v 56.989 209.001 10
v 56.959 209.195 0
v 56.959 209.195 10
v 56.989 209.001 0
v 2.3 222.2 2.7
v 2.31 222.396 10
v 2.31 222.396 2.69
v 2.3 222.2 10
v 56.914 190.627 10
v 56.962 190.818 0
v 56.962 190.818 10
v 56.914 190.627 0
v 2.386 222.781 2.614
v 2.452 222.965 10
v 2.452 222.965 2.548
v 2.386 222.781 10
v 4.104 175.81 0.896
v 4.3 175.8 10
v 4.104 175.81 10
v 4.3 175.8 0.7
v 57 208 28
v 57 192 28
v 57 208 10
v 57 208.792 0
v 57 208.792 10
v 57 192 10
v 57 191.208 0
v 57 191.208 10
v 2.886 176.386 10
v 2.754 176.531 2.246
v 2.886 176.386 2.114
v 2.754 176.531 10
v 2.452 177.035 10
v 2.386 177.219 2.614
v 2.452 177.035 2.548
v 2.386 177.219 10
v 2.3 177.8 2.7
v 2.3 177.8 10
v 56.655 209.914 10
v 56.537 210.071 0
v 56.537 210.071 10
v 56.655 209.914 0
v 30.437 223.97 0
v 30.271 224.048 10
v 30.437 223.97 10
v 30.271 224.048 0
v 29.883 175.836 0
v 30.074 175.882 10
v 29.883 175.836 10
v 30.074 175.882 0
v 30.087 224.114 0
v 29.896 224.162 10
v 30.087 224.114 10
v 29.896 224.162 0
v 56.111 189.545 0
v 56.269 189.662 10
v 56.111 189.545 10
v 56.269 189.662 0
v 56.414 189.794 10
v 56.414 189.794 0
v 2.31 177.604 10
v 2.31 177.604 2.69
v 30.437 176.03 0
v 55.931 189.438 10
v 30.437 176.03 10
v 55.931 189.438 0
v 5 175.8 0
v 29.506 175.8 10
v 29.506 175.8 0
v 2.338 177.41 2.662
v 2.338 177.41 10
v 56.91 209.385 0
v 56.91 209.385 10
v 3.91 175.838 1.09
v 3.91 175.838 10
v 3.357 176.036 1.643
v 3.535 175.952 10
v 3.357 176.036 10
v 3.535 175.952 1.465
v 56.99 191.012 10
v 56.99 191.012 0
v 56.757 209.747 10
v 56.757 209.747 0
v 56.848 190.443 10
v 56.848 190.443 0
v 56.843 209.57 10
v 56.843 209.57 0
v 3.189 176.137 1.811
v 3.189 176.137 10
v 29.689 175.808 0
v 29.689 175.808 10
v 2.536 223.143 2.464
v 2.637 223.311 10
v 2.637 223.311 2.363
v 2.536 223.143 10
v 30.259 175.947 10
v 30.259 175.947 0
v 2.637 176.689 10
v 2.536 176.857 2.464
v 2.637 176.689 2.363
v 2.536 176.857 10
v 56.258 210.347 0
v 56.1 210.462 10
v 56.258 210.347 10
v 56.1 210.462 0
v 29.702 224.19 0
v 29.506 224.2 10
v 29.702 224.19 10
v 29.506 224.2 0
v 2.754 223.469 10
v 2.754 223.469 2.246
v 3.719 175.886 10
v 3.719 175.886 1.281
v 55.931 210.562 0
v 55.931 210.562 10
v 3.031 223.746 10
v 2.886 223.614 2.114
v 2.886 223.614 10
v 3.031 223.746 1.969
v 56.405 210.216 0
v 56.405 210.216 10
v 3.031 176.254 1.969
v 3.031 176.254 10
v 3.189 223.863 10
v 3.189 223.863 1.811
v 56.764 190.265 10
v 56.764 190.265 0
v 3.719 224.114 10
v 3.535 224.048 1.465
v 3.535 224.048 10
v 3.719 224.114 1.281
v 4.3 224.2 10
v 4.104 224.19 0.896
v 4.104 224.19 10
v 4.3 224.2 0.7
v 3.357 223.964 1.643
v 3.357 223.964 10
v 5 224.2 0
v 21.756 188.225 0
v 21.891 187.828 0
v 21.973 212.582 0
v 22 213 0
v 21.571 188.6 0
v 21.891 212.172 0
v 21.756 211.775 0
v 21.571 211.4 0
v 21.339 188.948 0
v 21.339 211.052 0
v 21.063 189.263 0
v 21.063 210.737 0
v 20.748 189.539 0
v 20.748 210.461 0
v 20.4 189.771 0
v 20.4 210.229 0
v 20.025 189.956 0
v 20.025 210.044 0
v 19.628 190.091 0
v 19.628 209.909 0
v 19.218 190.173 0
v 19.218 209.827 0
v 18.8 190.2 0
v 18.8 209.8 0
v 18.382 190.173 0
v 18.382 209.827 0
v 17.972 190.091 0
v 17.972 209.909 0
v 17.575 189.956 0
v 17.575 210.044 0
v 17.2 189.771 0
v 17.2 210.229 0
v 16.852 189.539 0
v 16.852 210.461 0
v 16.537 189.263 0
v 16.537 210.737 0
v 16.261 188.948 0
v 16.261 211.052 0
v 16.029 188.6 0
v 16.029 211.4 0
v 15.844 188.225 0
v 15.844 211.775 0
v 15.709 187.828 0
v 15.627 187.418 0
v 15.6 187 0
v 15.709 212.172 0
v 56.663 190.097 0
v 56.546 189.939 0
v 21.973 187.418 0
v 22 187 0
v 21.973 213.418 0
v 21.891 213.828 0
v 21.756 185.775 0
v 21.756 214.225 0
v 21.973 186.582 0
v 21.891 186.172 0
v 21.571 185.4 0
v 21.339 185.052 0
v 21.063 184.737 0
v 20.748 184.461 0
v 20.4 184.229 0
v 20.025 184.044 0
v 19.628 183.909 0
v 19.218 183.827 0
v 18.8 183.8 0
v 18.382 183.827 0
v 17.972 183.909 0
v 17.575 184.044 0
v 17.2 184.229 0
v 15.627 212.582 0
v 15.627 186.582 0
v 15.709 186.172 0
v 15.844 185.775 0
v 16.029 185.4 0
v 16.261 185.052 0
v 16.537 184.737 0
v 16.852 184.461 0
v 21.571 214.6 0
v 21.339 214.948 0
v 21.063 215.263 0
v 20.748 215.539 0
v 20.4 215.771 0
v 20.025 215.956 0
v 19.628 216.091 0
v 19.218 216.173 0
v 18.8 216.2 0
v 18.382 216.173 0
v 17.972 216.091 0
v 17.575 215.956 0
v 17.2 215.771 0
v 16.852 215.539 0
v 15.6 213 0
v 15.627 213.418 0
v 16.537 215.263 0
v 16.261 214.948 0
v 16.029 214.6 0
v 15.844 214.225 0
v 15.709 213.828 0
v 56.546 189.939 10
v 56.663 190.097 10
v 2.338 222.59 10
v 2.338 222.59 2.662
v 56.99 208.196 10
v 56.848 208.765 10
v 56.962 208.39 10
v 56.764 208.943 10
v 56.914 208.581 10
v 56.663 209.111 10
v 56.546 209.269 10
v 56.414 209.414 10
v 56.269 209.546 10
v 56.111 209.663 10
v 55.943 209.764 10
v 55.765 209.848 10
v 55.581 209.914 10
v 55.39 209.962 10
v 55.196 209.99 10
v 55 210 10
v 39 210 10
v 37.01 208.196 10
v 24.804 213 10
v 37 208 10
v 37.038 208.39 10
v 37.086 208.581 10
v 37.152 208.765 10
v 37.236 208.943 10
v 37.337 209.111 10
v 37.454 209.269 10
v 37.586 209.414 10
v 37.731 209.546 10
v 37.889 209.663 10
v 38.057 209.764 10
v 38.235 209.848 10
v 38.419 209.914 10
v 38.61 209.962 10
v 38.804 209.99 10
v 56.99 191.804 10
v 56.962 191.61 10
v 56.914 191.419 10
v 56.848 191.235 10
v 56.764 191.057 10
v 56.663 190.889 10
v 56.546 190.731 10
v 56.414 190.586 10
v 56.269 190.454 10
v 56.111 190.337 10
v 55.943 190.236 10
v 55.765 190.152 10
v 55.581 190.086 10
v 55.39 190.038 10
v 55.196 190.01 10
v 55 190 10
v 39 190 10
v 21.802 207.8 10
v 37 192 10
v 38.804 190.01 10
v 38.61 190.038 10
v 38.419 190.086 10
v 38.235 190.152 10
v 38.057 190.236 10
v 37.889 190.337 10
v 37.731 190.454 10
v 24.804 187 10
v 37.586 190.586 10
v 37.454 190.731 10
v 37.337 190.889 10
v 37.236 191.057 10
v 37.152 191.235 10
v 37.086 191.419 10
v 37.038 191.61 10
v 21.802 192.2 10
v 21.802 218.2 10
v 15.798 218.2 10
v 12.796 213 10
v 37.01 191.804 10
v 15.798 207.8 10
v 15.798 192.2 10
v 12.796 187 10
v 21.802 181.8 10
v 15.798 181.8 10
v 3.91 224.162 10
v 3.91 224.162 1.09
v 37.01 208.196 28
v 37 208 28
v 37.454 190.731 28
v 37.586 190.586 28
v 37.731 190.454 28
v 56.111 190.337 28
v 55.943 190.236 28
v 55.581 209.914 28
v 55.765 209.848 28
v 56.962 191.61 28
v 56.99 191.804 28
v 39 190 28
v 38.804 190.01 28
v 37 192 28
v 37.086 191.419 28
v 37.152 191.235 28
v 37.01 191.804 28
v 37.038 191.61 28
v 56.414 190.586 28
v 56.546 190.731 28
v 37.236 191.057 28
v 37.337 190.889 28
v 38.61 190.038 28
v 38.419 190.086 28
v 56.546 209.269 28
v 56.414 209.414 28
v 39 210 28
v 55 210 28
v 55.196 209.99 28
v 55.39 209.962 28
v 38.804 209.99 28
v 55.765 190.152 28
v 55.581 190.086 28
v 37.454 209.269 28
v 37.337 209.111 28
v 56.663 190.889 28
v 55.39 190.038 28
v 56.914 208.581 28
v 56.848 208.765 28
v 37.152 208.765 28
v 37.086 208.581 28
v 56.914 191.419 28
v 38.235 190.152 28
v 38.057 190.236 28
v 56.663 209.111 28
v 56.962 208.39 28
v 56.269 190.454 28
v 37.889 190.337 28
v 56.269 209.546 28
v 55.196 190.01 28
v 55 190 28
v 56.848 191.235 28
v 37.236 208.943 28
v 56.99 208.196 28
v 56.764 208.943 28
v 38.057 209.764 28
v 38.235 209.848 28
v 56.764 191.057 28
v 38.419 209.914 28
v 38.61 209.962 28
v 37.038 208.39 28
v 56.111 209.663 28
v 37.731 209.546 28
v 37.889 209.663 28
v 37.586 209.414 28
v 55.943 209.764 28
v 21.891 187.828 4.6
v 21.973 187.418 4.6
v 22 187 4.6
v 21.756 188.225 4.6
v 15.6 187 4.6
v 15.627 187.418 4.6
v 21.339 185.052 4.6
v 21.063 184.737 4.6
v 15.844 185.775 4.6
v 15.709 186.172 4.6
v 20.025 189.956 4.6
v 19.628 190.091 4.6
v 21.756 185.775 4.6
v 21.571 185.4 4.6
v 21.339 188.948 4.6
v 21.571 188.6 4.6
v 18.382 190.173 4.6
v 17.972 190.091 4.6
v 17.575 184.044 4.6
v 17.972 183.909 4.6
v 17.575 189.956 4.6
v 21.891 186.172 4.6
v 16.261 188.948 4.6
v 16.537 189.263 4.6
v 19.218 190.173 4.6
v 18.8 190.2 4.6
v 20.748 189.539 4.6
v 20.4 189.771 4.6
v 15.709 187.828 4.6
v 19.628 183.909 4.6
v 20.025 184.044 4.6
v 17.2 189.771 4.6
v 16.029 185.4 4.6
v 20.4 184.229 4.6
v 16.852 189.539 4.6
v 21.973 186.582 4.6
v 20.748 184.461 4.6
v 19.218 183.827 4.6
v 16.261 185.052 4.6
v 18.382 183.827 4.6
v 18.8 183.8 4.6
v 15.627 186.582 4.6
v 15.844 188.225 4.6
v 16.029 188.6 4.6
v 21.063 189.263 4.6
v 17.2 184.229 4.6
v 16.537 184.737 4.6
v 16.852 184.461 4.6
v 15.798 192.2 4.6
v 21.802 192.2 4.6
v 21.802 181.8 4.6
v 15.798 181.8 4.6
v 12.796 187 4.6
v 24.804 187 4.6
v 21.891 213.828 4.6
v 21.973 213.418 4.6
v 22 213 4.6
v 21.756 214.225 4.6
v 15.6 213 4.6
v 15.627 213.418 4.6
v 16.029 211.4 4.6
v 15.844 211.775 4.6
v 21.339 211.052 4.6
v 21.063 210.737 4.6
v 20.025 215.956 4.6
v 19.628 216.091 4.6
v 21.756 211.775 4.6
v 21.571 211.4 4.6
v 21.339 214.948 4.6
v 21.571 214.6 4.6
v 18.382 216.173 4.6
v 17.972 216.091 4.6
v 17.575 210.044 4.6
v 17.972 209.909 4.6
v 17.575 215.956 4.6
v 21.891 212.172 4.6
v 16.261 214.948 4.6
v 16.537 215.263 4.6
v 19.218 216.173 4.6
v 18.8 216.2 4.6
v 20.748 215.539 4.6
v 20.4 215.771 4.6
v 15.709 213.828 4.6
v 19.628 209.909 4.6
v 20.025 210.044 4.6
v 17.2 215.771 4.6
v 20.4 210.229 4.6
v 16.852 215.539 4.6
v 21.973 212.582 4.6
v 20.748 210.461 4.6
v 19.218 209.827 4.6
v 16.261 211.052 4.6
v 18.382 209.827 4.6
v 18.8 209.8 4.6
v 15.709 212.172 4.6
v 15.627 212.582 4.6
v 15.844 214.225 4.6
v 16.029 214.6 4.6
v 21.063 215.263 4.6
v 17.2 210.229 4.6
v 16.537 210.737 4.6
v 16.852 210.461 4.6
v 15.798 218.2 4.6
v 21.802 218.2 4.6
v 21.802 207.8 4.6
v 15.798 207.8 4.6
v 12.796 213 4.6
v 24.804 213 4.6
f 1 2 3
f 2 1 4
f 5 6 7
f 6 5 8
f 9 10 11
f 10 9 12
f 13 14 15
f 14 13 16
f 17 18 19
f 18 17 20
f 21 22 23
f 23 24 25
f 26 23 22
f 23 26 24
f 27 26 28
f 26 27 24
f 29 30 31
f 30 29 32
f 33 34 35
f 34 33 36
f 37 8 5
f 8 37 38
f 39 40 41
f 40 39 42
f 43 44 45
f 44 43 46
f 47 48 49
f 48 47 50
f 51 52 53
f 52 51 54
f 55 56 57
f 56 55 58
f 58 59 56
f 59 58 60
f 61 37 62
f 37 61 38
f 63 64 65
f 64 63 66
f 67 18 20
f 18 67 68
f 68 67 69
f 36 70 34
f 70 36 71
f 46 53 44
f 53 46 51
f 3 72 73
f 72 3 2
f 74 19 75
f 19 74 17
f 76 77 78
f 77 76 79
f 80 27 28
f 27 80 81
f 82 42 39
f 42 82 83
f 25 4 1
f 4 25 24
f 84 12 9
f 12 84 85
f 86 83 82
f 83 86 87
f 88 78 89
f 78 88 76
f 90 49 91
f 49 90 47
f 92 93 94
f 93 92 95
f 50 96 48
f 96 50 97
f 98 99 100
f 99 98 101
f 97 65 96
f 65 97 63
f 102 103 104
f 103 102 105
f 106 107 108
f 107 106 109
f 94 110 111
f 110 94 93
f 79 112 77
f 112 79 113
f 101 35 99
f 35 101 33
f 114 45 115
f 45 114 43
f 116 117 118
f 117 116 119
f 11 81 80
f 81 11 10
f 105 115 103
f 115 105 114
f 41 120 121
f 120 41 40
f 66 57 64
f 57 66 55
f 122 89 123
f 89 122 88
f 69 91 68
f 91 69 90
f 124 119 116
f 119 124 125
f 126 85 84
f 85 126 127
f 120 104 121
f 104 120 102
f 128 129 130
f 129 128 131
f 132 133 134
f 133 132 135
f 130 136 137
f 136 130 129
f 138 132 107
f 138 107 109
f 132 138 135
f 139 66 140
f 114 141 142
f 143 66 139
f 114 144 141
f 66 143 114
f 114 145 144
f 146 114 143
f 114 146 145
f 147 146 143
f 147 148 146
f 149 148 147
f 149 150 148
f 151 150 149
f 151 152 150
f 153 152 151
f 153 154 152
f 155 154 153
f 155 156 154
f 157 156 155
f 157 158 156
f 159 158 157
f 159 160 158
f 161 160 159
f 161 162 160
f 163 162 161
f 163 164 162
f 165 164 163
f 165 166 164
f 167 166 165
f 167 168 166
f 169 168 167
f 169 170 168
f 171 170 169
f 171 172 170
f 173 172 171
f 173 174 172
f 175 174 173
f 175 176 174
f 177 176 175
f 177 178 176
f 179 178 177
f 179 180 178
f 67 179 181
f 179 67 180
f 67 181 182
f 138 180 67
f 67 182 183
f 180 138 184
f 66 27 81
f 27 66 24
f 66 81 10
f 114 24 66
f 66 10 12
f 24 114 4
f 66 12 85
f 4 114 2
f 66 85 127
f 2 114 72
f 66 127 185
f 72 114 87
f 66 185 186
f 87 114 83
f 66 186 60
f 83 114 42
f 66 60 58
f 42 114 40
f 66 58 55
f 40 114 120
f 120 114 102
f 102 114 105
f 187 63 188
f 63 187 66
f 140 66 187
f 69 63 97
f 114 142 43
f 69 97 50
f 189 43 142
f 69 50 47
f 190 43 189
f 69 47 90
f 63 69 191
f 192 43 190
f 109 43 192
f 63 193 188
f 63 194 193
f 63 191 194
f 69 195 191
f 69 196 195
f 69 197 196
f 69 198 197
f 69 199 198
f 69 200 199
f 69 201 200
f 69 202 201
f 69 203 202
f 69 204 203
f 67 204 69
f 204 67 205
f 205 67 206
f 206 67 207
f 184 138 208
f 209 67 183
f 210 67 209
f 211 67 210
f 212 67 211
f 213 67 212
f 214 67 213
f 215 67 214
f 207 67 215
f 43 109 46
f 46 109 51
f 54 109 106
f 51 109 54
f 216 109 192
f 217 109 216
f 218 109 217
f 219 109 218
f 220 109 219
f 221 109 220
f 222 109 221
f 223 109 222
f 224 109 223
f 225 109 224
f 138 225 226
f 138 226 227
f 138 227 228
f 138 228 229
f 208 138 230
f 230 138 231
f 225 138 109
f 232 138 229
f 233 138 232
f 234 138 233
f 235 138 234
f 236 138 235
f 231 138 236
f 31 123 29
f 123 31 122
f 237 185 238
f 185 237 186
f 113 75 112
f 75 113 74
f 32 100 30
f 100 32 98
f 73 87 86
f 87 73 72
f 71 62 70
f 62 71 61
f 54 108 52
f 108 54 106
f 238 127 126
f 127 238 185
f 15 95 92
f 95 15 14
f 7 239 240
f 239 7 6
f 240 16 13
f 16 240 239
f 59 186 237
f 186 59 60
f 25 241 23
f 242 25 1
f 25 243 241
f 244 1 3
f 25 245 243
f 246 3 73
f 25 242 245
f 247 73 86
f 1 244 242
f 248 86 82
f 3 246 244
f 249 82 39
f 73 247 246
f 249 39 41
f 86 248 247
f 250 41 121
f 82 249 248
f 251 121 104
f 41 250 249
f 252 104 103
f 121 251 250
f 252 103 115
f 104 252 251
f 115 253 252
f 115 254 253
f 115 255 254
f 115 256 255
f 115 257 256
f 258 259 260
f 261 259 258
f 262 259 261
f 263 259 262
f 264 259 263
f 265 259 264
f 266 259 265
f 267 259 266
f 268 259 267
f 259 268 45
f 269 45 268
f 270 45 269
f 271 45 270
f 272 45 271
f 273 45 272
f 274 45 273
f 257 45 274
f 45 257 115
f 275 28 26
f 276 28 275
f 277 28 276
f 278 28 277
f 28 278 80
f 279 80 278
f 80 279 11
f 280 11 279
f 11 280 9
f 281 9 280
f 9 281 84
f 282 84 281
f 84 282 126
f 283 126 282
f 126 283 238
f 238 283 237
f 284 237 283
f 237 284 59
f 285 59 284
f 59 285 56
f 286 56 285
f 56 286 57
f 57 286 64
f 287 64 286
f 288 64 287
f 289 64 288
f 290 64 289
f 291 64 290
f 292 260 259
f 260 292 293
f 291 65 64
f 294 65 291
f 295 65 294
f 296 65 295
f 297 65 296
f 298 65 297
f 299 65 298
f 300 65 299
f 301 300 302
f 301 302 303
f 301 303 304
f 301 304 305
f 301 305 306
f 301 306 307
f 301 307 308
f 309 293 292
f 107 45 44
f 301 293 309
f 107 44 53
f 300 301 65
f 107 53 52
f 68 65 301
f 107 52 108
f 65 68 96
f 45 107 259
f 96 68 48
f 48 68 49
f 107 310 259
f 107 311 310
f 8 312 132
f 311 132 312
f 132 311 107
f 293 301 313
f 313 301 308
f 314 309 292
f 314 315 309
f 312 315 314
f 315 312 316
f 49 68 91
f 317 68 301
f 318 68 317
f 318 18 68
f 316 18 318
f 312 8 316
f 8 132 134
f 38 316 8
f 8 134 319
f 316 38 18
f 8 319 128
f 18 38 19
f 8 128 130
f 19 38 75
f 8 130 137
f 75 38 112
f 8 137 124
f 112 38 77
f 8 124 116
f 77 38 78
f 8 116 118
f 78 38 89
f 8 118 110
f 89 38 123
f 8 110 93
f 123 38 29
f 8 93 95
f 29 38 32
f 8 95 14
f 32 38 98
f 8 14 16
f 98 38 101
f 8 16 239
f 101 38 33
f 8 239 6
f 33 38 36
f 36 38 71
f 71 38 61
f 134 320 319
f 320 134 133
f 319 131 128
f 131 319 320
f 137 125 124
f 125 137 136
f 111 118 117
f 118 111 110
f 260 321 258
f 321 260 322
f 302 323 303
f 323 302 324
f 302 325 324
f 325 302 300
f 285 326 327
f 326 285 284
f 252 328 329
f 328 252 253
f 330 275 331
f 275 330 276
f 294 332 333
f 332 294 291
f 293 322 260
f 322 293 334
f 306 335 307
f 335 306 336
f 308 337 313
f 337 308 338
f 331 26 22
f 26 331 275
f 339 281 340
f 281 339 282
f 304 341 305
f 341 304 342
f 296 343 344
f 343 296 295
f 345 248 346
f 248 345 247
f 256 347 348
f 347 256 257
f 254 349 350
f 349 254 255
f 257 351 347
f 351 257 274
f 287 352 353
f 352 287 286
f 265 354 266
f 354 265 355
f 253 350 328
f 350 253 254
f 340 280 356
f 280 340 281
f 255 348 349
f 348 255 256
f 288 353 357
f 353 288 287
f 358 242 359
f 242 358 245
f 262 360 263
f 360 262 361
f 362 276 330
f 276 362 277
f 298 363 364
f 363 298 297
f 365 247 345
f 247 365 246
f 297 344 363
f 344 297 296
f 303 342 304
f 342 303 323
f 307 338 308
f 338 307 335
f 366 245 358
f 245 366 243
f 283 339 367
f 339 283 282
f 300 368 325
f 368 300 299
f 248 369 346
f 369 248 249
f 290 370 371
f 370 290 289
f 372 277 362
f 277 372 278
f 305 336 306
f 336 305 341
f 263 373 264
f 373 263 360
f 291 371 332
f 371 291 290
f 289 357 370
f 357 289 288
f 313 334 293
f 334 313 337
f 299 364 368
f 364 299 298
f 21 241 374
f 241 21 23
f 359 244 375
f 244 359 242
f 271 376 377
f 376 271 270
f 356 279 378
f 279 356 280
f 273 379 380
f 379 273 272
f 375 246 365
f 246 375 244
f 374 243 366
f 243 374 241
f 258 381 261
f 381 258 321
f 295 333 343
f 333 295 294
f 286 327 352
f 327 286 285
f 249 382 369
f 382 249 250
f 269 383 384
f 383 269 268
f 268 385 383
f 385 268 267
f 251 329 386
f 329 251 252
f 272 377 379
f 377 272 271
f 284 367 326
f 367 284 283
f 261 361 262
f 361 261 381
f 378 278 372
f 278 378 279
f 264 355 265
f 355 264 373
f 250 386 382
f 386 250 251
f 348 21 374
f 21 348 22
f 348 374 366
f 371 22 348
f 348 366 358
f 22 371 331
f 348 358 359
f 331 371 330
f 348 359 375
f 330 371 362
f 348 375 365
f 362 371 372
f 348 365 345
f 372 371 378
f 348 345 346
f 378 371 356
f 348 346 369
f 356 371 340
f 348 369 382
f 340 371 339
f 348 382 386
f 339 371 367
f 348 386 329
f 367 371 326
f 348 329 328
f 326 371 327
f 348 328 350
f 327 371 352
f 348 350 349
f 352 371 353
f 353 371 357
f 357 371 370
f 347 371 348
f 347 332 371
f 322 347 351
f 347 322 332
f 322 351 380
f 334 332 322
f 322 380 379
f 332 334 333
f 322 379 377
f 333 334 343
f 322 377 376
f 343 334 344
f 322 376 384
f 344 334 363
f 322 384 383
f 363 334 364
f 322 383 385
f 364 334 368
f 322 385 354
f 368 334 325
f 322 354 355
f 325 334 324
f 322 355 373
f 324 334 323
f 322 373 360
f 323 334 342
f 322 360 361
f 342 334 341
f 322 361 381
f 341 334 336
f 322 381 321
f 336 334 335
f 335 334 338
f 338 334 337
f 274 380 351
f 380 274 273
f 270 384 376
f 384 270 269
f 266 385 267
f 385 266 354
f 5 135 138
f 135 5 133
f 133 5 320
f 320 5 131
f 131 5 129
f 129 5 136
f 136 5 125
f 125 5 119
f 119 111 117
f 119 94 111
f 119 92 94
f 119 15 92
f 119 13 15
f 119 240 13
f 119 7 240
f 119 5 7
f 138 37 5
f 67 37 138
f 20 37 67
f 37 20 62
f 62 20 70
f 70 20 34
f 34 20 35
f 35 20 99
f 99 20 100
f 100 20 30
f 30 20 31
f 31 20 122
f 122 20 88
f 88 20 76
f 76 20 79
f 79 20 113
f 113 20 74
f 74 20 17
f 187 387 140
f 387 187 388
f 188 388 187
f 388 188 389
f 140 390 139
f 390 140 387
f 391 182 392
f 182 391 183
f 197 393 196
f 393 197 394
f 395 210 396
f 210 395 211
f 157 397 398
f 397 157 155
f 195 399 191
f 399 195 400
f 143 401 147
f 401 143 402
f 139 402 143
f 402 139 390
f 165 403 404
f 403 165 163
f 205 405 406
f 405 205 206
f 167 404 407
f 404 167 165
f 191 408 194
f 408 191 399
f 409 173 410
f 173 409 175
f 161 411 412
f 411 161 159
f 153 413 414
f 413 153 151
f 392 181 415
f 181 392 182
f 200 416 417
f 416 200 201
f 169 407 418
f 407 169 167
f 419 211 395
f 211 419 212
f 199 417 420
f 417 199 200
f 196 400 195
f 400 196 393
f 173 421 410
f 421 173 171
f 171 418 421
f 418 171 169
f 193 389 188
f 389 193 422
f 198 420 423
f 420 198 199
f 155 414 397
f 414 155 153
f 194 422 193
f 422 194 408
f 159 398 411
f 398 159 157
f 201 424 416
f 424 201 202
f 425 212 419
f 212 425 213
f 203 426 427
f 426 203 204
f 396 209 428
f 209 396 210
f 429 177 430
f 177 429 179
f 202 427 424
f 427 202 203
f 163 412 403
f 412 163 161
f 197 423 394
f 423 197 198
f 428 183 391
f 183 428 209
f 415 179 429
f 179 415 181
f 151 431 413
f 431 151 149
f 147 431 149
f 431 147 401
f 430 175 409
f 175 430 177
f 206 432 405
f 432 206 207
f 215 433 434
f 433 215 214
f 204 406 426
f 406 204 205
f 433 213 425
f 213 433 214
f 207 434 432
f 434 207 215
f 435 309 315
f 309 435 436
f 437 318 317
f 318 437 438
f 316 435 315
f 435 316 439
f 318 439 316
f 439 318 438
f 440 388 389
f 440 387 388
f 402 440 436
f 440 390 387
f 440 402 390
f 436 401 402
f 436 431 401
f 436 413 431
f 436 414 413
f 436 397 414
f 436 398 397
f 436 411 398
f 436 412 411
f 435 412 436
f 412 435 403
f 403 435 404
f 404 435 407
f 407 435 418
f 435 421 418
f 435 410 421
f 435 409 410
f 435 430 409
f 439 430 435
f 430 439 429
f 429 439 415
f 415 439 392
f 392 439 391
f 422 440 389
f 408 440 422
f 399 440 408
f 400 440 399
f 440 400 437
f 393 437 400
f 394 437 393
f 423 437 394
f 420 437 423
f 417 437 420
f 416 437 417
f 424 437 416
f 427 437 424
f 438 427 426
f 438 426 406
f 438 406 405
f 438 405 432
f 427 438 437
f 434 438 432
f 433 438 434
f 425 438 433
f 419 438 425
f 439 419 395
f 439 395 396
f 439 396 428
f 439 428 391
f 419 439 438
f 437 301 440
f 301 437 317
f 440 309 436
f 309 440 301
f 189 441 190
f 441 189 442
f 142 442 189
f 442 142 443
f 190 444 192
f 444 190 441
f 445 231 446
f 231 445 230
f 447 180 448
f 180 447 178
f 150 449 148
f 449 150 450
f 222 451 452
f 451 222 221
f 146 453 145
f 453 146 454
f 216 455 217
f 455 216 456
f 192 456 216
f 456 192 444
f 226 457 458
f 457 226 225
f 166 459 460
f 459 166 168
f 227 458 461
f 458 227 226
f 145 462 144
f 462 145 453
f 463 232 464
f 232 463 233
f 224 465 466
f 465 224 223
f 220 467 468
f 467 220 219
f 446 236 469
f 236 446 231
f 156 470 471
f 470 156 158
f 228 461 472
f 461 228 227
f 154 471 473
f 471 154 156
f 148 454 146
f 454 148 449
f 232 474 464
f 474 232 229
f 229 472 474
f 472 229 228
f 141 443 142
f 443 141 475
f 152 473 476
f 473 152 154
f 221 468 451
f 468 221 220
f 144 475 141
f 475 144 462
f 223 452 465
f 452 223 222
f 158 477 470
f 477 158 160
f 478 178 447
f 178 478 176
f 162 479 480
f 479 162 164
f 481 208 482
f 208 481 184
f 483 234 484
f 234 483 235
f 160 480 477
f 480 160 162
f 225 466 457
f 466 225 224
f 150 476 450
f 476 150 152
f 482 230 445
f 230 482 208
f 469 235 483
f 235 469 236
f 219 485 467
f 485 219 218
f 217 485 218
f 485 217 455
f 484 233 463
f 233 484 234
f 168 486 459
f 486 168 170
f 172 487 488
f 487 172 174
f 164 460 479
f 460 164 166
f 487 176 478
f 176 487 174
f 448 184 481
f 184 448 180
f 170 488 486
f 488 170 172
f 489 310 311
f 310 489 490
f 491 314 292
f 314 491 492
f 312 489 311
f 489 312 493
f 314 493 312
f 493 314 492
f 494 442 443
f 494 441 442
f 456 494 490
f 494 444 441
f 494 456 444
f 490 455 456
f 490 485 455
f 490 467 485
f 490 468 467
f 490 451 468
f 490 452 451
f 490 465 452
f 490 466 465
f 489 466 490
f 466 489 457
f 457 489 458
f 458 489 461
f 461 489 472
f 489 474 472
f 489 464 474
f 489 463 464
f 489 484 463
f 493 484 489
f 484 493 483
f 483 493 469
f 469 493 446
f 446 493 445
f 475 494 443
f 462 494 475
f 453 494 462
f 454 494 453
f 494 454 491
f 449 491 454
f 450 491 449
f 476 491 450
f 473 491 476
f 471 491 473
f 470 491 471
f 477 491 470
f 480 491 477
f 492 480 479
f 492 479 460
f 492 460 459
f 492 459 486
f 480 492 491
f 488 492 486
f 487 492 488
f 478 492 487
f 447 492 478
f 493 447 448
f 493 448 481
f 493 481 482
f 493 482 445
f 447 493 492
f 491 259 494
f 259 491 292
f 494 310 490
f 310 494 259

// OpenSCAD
// file: ../../../modules/steel_rack.scad
use <bolts.scad>;

bolt_edge_offset = 15;
bolt_positions = [
  bolt_edge_offset,
  bolt_edge_offset + 98,
  bolt_edge_offset + 98 + 24,
];

module bolt_and_nut(y, h) {
  nut_thickness = 5;
  translate([0, y, h / 2])
    m6_bolt_hole(h + 1, center = true);
  translate([0, y, h - nut_thickness / 2])
    rotate([0, 0, 90])
    m6_nut_trap(nut_thickness, center = true);
}

module long_bar(w, y, h) {
  difference() {
    translate([w / 2, y / 2, h / 2])
      cube([w, y, h], center = true);

    for (x = bolt_positions) {
      translate([x, 0, 0])
        bolt_and_nut(y / 2, h);
    }
  }
}

module short_bar(w, y, h) {
  difference() {
    translate([w / 2, y / 2, h / 2])
      cube([w, y, h], center = true);

    translate([bolt_positions[0], 0, 0])
      bolt_and_nut(y / 2, h);
  }
}

module fillet_profile(r, h) {
  linear_extrude(height = h, center = true)
    difference() {
      square([r, r]);
      circle(r = r, $fn = 64);
    }
}
// file: ../../../modules/slide_rail_outer_bracket.scad
use <bolts.scad>
use <steel_rack.scad>

// スライドレール外側とL字アングルを接合するL字ブラケット。
// 設計の経緯と確定値は ledger/designs/steel-rack-500x400.md が正本。
//
// 座標系 (部品自身の datum):
//   X = 0 がこの部品側のL字アングル外側面。部品はアングル板厚の内側から始まる
//   Y = 0 がスライドレール外側面。+Y がラック外側
//   Z = 0 が部品底面 (レール下端と一致)
// front は screw_x = [37, 101.5]、rear は [79.5, 176] を自分の datum
// から渡す。 M6 が高さ 22.5±12 の対称配置のため部品は Z 反転対称になり、
// 左右のレールにも上下反転するだけで同じ2部品を使い回せる。

bracket_height = 45;
flange_t = 10; // 短辺 (X方向厚) の厚さ
// 長辺 (Y方向厚) の厚さ。旧断面は flange_t=10 を共用していたが、レール面を
// rail_offset 分外へ出すと M6 ナット挿入口が長辺と重なるため 2mm 削った
// (10→8、user決定)。ナット六角の内縁 (y=8.000) と長辺外面がツライチになる
arm_t = 8;
// レール接触面のラック外側オフセット。組付け実測でレール間隔が 385mm しか
// なくケース 412mm が入らないため、(412 - 385) / 2 + 0.5 = 14mm ずつ
// 各レールを外側へ移す (user指示)。M6 実穴は既に開いており位置を変えられない
rail_offset = 14;
inner_r = 4;
m6_z = [ 10.5, 34.5 ];
// クリアランス基準: 呼び寸法 + 0.4mm (実プリントの嵌合結果から拡大)
m6_pass_flat = 6.4; // M6ボルト通し六角の二面幅 (手前5mm)
m6_nut_flat = 10.4; // M6ナット窪み六角の二面幅 (奥5mm、ナット実測9.8 + 実効0.6)
m6_stage_depth = 5;
screw_z = 22.5;
m4_pass_flat = 4.4; // M4小トラスネジ通し六角の二面幅
m4_nut_flat = 7.4; // M4ナット窪み六角の二面幅 (ナット実測6.8 + 実効0.6)
m4_nut_depth = 2.8; // M4ナット窪みの深さ (user指定)
edge_margin = 8; // 穴の外縁から部品端までの余白 (自由な辺のみ)
angle_t = 2.2; // L字アングルの板厚

// 六角プリズム: 軸X・上下の辺が水平 (flat-up)。
// 天井を短い水平ブリッジにして垂れの改善を狙う
// (point-up だと天井面が水平から30°になり垂れた — 嵌合試験で確認済み)
module
hex_x_flat_up(flat_d, l)
{
    rotate([ 0, 90, 0 ]) rotate([ 0, 0, 90 ]) hex_hole(flat_d = flat_d, h = l);
}

// 六角プリズム: 軸Y・上下の辺が水平 (flat-up)。M6と同じくブリッジ天井
module
hex_y_flat_up(flat_d, l)
{
    rotate([ 90, 0, 0 ]) hex_hole(flat_d = flat_d, h = l);
}

module
slide_rail_outer_bracket(screw_x, name = "bracket")
{
    // flat-up配置では水平方向の穴半径は対角/2 (= 二面幅/(2*cos30))。
    // 8mm余白の契約はこの実半径に対して守る
    m6_nut_diag = m6_nut_flat / cos(30);
    m4_nut_diag = m4_nut_flat / cos(30);
    // M6中心: 実物のアングルには旧断面 (長辺厚10) の導出値
    // (厚10 + 内側R + 余白 + M6六角対角/2 = 28.0044) で既に穴が開いている。
    // 旧導出式から rail_offset を引くことで M6 実穴と部品外端の絶対位置を
    // 保ったまま、レール接触面 (y=0) だけをラック外側へ 14mm 出す
    m6_y = flange_t + inner_r + edge_margin + m6_nut_diag / 2 - rail_offset;
    short_len = m6_y + m6_nut_diag / 2 + edge_margin;
    // 長辺のX終端: 最奥のM4穴の最大断面 (ナット窪みの対角の半分) + 余白
    arm_end = max(screw_x) + m4_nut_diag / 2 + edge_margin;

    echo(str("CONTRACT ", name, ": height = ", bracket_height));
    echo(str("CONTRACT ", name, ": flange_t = ", flange_t));
    echo(str("CONTRACT ", name, ": arm_t = ", arm_t));
    echo(str("CONTRACT ", name, ": rail_offset = ", rail_offset));
    echo(str("CONTRACT ", name, ": inner_r = ", inner_r));
    echo(str("CONTRACT ", name, ": m6_z = ", m6_z));
    echo(str("CONTRACT ", name, ": m6_pass_flat = ", m6_pass_flat));
    echo(str("CONTRACT ", name, ": m6_nut_flat = ", m6_nut_flat));
    echo(str("CONTRACT ", name, ": screw_z = ", screw_z));
    echo(str("CONTRACT ", name, ": m4_pass_flat = ", m4_pass_flat));
    echo(str("CONTRACT ", name, ": m4_nut_flat = ", m4_nut_flat));
    echo(str("CONTRACT ", name, ": m4_nut_depth = ", m4_nut_depth));
    echo(str("CONTRACT ", name, ": edge_margin = ", edge_margin));
    echo(str("CONTRACT ", name, ": angle_t = ", angle_t));
    echo(str("CONTRACT ", name, ": screw_x = ", screw_x));
    echo(str("CONTRACT ",
             name,
             ": m6_y = ",
             m6_y,
             ", short_len = ",
             short_len,
             ", arm_end = ",
             arm_end));

    // 余白の契約 (自由な辺のみ。高さ45とM6のZはuser固定値なので対象外)。
    // M6ナット六角の内縁 (m6_y - 対角/2 = 8.000) は長辺外面 (y = arm_t) と
    // ツライチで、ナット挿入口が長辺に塞がれない (1e-9 は浮動小数の丸め猶予)
    assert(m6_y - m6_nut_diag / 2 >= arm_t - 1e-9,
           "M6 nut slot is blocked by the arm");
    assert(short_len - (m6_y + m6_nut_diag / 2) >= edge_margin,
           "M6 hole too close to the short-flange edge");
    assert(arm_end - (max(screw_x) + m4_nut_diag / 2) >= edge_margin,
           "M4 hole too close to the arm end");
    assert(min(screw_x) - m4_nut_diag / 2 >= angle_t + flange_t,
           "M4 hole overlaps the short flange");

    difference()
    {
        union()
        {
            // 短辺: アングル内側に当たる縦板 (M6で締結)
            translate([ angle_t, 0, 0 ])
                cube([ flange_t, short_len, bracket_height ]);

            // 長辺: レール外側面に当たる横板 (M4小トラスネジ+ナットで締結)
            translate([ angle_t, 0, 0 ])
                cube([ arm_end - angle_t, arm_t, bracket_height ]);

            // 内側コーナーのR4フィレット (応力集中の回避)
            translate([
                angle_t + flange_t + inner_r,
                arm_t + inner_r,
                bracket_height / 2
            ]) rotate([ 0, 0, 180 ]) fillet_profile(inner_r, bracket_height);
        }

        // M6の2段六角穴 (軸X・flat-up): 手前5mmが通し、奥5mmがナット窪み。
        // ナット窪みは +X へ延長した挿入回廊 (x=7.2..17): 短辺の背面から
        // fillet の掛かる区間を局所カットし、fillet 外端 (x=16.2) を 0.8mm
        // 超えて開放することで M6 ナットを +X 側から真っ直ぐ挿入できる
        // (fillet と挿入経路の干渉分を削るのは user 許容)。
        // 六角の下頂点 (y=8.000) は長辺外面とツライチで、正確な接触は
        // 退化した稜 (非多様体STL) を作るため、hull で 0.2mm 下へ掃引して
        // 長辺外面に浅い逃げ溝を彫る (ナットの嵌合には影響しない)
        slot_start = angle_t + flange_t - m6_stage_depth;
        slot_end = angle_t + flange_t + inner_r + 0.8;
        slot_relief = 0.2;
        for (z = m6_z) {
            translate([ angle_t + m6_stage_depth / 2 - 0.05, m6_y, z ])
                hex_x_flat_up(m6_pass_flat, m6_stage_depth + 0.1);
            translate([ (slot_start + slot_end) / 2, m6_y, z ]) hull()
            {
                hex_x_flat_up(m6_nut_flat, slot_end - slot_start);
                translate([ 0, -slot_relief, 0 ])
                    hex_x_flat_up(m6_nut_flat, slot_end - slot_start);
            }
        }

        // M4小トラスネジの穴 (軸Y・flat-up):
        // 通しは全厚を貫通し、L字の内側面 (y=8) から深さ2.8mmのナット窪み。
        // ネジはレール内側から刺さり
        // (トラス頭はスライダーと干渉しない実測済み)、
        // ナットが窪みの底で受けてレール板とブラケットを共締めする
        for (x = screw_x) {
            translate([ x, arm_t / 2, screw_z ])
                hex_y_flat_up(m4_pass_flat, arm_t + 0.2);
            translate([ x, arm_t - m4_nut_depth / 2 + 0.05, screw_z ])
                hex_y_flat_up(m4_nut_flat, m4_nut_depth + 0.1);
        }
    }
}
// file: ../../../modules/bolts.scad
module nut_trap(d, h, center = true) {
  linear_extrude(height = h, center = center)
  circle(d = d / cos(30), $fn = 6);
}

module bolt_hole(d, h, center = true) {
  linear_extrude(height = h, center = center)
  circle(d = d, $fn = 64);
}

// Hex holes for self-tapping (nominal - 0.2mm)
module hex_hole(flat_d, h) {
  linear_extrude(height = h, center = true)
  circle(d = flat_d / cos(30), $fn = 6);
}

module m3_bolt_hexhole(h) {
  rotate([0, 0, 90]) hex_hole(flat_d = 2.8, h = h);
}

module m4_bolt_hexhole(h) {
  rotate([0, 0, 90]) hex_hole(flat_d = 3.8, h = h);
}

module m6_bolt_hexhole(h) {
  rotate([0, 0, 90]) hex_hole(flat_d = 5.8, h = h);
}

module m8_bolt_hexhole(h) {
  rotate([0, 0, 90]) hex_hole(flat_d = 7.8, h = h);
}

// M3
module m3_bolt_hole(h, center = false) { bolt_hole(d = 3.4, h = h, center = center); }
module m3_nut_trap(h, center = false) { nut_trap(d = 5.7, h = h, center = center); }

// M4
module m4_bolt_hole(h, center = false) { bolt_hole(d = 4.4, h = h, center = center); }
module m4_nut_trap(h, center = false) { nut_trap(d = 7.5, h = h, center = center); }

// M6
module m6_bolt_hole(h, center = false) { bolt_hole(d = 6.2, h = h, center = center); }
module m6_nut_trap(h, center = false) { nut_trap(d = 10.2, h = h, center = center); }

// M8
module m8_bolt_hole(h, center = false) { bolt_hole(d = 8.4, h = h, center = center); }
module m8_nut_trap(h, center = false) { nut_trap(d = 13.3, h = h, center = center); }
// main file
use <../../../modules/shelf_frame.scad>

// ケース棚の辺の支え。左右の30cm材の中央用。
shelf_frame_flat_print() shelf_frame_mid_side();
